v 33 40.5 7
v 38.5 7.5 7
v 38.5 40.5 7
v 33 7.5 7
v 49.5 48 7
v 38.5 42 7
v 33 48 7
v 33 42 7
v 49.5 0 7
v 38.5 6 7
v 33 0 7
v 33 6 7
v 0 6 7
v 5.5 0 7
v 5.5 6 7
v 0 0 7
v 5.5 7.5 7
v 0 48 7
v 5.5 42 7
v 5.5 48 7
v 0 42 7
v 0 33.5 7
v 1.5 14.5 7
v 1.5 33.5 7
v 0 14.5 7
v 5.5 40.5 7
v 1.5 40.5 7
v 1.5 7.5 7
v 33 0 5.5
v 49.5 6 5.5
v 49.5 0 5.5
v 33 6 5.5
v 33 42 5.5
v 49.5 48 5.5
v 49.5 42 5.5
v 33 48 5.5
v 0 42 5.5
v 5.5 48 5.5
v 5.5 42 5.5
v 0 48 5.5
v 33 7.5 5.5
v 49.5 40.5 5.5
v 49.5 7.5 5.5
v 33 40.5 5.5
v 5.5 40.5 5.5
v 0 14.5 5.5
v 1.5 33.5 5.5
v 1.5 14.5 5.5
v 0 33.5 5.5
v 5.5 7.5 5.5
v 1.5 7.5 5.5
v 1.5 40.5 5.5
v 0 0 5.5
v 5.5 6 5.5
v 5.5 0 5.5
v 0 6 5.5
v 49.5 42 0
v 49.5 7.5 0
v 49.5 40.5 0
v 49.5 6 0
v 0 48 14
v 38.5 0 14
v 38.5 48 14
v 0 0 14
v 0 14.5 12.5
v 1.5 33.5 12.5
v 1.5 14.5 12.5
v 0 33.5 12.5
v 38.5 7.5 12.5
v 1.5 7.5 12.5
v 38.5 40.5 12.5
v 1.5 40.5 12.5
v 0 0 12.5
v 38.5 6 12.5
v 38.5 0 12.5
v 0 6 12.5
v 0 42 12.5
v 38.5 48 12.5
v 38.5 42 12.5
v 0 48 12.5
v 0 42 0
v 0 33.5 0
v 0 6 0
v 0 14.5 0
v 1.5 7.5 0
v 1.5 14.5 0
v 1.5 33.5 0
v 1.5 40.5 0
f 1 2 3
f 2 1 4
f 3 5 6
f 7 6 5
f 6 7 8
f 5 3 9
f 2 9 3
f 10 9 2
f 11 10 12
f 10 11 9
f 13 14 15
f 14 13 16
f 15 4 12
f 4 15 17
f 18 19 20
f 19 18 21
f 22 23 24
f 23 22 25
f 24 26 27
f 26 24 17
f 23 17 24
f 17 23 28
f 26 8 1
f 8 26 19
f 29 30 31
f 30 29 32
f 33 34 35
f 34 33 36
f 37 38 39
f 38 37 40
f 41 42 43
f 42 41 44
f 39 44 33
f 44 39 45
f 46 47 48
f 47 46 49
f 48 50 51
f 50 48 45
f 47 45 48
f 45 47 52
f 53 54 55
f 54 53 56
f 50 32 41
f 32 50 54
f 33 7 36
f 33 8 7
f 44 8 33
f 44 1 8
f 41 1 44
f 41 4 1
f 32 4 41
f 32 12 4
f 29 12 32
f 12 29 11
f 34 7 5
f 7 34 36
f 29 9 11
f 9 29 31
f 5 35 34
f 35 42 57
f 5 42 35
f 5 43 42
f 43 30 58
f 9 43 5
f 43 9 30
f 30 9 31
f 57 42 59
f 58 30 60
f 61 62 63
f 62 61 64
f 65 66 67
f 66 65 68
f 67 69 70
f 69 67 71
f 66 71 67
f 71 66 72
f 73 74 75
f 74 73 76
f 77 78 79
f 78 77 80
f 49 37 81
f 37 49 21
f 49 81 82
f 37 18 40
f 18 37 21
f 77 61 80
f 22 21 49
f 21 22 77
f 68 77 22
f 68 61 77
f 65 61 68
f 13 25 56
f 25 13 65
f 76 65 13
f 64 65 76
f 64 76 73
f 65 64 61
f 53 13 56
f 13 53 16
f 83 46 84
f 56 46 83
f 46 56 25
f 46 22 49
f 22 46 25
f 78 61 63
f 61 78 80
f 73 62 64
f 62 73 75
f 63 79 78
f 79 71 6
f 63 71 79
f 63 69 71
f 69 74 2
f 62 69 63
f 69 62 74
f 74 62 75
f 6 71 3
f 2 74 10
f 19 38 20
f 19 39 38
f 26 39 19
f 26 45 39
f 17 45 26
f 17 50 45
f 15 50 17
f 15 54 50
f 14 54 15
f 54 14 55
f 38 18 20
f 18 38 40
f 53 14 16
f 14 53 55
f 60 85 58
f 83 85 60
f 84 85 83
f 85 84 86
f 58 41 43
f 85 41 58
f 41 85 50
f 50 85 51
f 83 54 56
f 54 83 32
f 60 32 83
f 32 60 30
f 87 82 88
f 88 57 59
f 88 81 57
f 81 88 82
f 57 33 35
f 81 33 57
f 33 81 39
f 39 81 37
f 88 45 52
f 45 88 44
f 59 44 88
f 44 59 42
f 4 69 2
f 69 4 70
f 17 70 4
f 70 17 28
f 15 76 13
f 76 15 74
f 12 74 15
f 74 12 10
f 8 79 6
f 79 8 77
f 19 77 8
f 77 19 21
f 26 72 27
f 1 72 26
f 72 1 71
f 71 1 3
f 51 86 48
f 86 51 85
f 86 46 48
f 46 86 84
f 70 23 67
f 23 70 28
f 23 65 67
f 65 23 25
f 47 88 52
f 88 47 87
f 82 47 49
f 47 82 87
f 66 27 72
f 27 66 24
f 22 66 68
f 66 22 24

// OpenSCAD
//Globals
$fn=100;
Opacity=0.6;

//Posts
module Step(){color("tan",Opacity)cube([5.5,48,1.5]);}
translate([0,0,5.5])Step();
for (a=[0:2]){
translate([6*5.5+a*5.5,0,5.5])Step();}
for (a=[0:6]){
translate([a*5.5,0,1.5+2*5.5])Step();}


//Rails
module BottomRail(){color("gray",Opacity)cube([9*5.5,1.5,5.5]);}
translate([0,6,0])BottomRail();
translate([0,42-1.5,0])BottomRail();

module TopRail(){color("gray",Opacity)cube([7*5.5,1.5,5.5]);}
translate([0,6,5.5+1.5])TopRail();
translate([0,42-1.5,5.5+1.5])TopRail();

//Supports
module Support(){color("lightgray",Opacity)cube([1.5,7.5,5.5]);}
translate([0,5.5+1.5,0])Support();
translate([0,5.5+1.5,5.5+1.5])Support();
translate([0,48-5.5-1.5-7.5,0])Support();
translate([0,48-5.5-1.5-7.5,5.5+1.5])Support();
 
CubePoints = [
  [ 0, 0, 0],  //0
  [ 0.5, 0, 0 ],  //1
  [ 0.5, 3.5, 0 ],  //2
  [ 0, 3.5, 0 ],  //3
  [ 0, 1, 1 ],  //4
  [ 0.5, 1, 1 ],  //5
  [ 0.5, 2.5, 1 ],  //6
  [ 0, 2.5, 1 ]]; //7
   
CubeFaces = [
  [0,1,2,3],  // bottom
  [4,5,1,0],  // front
  [7,6,5,4],  // top
  [5,6,2,1],  // right
  [6,7,3,2],  // back
  [7,4,0,3]]; // left
